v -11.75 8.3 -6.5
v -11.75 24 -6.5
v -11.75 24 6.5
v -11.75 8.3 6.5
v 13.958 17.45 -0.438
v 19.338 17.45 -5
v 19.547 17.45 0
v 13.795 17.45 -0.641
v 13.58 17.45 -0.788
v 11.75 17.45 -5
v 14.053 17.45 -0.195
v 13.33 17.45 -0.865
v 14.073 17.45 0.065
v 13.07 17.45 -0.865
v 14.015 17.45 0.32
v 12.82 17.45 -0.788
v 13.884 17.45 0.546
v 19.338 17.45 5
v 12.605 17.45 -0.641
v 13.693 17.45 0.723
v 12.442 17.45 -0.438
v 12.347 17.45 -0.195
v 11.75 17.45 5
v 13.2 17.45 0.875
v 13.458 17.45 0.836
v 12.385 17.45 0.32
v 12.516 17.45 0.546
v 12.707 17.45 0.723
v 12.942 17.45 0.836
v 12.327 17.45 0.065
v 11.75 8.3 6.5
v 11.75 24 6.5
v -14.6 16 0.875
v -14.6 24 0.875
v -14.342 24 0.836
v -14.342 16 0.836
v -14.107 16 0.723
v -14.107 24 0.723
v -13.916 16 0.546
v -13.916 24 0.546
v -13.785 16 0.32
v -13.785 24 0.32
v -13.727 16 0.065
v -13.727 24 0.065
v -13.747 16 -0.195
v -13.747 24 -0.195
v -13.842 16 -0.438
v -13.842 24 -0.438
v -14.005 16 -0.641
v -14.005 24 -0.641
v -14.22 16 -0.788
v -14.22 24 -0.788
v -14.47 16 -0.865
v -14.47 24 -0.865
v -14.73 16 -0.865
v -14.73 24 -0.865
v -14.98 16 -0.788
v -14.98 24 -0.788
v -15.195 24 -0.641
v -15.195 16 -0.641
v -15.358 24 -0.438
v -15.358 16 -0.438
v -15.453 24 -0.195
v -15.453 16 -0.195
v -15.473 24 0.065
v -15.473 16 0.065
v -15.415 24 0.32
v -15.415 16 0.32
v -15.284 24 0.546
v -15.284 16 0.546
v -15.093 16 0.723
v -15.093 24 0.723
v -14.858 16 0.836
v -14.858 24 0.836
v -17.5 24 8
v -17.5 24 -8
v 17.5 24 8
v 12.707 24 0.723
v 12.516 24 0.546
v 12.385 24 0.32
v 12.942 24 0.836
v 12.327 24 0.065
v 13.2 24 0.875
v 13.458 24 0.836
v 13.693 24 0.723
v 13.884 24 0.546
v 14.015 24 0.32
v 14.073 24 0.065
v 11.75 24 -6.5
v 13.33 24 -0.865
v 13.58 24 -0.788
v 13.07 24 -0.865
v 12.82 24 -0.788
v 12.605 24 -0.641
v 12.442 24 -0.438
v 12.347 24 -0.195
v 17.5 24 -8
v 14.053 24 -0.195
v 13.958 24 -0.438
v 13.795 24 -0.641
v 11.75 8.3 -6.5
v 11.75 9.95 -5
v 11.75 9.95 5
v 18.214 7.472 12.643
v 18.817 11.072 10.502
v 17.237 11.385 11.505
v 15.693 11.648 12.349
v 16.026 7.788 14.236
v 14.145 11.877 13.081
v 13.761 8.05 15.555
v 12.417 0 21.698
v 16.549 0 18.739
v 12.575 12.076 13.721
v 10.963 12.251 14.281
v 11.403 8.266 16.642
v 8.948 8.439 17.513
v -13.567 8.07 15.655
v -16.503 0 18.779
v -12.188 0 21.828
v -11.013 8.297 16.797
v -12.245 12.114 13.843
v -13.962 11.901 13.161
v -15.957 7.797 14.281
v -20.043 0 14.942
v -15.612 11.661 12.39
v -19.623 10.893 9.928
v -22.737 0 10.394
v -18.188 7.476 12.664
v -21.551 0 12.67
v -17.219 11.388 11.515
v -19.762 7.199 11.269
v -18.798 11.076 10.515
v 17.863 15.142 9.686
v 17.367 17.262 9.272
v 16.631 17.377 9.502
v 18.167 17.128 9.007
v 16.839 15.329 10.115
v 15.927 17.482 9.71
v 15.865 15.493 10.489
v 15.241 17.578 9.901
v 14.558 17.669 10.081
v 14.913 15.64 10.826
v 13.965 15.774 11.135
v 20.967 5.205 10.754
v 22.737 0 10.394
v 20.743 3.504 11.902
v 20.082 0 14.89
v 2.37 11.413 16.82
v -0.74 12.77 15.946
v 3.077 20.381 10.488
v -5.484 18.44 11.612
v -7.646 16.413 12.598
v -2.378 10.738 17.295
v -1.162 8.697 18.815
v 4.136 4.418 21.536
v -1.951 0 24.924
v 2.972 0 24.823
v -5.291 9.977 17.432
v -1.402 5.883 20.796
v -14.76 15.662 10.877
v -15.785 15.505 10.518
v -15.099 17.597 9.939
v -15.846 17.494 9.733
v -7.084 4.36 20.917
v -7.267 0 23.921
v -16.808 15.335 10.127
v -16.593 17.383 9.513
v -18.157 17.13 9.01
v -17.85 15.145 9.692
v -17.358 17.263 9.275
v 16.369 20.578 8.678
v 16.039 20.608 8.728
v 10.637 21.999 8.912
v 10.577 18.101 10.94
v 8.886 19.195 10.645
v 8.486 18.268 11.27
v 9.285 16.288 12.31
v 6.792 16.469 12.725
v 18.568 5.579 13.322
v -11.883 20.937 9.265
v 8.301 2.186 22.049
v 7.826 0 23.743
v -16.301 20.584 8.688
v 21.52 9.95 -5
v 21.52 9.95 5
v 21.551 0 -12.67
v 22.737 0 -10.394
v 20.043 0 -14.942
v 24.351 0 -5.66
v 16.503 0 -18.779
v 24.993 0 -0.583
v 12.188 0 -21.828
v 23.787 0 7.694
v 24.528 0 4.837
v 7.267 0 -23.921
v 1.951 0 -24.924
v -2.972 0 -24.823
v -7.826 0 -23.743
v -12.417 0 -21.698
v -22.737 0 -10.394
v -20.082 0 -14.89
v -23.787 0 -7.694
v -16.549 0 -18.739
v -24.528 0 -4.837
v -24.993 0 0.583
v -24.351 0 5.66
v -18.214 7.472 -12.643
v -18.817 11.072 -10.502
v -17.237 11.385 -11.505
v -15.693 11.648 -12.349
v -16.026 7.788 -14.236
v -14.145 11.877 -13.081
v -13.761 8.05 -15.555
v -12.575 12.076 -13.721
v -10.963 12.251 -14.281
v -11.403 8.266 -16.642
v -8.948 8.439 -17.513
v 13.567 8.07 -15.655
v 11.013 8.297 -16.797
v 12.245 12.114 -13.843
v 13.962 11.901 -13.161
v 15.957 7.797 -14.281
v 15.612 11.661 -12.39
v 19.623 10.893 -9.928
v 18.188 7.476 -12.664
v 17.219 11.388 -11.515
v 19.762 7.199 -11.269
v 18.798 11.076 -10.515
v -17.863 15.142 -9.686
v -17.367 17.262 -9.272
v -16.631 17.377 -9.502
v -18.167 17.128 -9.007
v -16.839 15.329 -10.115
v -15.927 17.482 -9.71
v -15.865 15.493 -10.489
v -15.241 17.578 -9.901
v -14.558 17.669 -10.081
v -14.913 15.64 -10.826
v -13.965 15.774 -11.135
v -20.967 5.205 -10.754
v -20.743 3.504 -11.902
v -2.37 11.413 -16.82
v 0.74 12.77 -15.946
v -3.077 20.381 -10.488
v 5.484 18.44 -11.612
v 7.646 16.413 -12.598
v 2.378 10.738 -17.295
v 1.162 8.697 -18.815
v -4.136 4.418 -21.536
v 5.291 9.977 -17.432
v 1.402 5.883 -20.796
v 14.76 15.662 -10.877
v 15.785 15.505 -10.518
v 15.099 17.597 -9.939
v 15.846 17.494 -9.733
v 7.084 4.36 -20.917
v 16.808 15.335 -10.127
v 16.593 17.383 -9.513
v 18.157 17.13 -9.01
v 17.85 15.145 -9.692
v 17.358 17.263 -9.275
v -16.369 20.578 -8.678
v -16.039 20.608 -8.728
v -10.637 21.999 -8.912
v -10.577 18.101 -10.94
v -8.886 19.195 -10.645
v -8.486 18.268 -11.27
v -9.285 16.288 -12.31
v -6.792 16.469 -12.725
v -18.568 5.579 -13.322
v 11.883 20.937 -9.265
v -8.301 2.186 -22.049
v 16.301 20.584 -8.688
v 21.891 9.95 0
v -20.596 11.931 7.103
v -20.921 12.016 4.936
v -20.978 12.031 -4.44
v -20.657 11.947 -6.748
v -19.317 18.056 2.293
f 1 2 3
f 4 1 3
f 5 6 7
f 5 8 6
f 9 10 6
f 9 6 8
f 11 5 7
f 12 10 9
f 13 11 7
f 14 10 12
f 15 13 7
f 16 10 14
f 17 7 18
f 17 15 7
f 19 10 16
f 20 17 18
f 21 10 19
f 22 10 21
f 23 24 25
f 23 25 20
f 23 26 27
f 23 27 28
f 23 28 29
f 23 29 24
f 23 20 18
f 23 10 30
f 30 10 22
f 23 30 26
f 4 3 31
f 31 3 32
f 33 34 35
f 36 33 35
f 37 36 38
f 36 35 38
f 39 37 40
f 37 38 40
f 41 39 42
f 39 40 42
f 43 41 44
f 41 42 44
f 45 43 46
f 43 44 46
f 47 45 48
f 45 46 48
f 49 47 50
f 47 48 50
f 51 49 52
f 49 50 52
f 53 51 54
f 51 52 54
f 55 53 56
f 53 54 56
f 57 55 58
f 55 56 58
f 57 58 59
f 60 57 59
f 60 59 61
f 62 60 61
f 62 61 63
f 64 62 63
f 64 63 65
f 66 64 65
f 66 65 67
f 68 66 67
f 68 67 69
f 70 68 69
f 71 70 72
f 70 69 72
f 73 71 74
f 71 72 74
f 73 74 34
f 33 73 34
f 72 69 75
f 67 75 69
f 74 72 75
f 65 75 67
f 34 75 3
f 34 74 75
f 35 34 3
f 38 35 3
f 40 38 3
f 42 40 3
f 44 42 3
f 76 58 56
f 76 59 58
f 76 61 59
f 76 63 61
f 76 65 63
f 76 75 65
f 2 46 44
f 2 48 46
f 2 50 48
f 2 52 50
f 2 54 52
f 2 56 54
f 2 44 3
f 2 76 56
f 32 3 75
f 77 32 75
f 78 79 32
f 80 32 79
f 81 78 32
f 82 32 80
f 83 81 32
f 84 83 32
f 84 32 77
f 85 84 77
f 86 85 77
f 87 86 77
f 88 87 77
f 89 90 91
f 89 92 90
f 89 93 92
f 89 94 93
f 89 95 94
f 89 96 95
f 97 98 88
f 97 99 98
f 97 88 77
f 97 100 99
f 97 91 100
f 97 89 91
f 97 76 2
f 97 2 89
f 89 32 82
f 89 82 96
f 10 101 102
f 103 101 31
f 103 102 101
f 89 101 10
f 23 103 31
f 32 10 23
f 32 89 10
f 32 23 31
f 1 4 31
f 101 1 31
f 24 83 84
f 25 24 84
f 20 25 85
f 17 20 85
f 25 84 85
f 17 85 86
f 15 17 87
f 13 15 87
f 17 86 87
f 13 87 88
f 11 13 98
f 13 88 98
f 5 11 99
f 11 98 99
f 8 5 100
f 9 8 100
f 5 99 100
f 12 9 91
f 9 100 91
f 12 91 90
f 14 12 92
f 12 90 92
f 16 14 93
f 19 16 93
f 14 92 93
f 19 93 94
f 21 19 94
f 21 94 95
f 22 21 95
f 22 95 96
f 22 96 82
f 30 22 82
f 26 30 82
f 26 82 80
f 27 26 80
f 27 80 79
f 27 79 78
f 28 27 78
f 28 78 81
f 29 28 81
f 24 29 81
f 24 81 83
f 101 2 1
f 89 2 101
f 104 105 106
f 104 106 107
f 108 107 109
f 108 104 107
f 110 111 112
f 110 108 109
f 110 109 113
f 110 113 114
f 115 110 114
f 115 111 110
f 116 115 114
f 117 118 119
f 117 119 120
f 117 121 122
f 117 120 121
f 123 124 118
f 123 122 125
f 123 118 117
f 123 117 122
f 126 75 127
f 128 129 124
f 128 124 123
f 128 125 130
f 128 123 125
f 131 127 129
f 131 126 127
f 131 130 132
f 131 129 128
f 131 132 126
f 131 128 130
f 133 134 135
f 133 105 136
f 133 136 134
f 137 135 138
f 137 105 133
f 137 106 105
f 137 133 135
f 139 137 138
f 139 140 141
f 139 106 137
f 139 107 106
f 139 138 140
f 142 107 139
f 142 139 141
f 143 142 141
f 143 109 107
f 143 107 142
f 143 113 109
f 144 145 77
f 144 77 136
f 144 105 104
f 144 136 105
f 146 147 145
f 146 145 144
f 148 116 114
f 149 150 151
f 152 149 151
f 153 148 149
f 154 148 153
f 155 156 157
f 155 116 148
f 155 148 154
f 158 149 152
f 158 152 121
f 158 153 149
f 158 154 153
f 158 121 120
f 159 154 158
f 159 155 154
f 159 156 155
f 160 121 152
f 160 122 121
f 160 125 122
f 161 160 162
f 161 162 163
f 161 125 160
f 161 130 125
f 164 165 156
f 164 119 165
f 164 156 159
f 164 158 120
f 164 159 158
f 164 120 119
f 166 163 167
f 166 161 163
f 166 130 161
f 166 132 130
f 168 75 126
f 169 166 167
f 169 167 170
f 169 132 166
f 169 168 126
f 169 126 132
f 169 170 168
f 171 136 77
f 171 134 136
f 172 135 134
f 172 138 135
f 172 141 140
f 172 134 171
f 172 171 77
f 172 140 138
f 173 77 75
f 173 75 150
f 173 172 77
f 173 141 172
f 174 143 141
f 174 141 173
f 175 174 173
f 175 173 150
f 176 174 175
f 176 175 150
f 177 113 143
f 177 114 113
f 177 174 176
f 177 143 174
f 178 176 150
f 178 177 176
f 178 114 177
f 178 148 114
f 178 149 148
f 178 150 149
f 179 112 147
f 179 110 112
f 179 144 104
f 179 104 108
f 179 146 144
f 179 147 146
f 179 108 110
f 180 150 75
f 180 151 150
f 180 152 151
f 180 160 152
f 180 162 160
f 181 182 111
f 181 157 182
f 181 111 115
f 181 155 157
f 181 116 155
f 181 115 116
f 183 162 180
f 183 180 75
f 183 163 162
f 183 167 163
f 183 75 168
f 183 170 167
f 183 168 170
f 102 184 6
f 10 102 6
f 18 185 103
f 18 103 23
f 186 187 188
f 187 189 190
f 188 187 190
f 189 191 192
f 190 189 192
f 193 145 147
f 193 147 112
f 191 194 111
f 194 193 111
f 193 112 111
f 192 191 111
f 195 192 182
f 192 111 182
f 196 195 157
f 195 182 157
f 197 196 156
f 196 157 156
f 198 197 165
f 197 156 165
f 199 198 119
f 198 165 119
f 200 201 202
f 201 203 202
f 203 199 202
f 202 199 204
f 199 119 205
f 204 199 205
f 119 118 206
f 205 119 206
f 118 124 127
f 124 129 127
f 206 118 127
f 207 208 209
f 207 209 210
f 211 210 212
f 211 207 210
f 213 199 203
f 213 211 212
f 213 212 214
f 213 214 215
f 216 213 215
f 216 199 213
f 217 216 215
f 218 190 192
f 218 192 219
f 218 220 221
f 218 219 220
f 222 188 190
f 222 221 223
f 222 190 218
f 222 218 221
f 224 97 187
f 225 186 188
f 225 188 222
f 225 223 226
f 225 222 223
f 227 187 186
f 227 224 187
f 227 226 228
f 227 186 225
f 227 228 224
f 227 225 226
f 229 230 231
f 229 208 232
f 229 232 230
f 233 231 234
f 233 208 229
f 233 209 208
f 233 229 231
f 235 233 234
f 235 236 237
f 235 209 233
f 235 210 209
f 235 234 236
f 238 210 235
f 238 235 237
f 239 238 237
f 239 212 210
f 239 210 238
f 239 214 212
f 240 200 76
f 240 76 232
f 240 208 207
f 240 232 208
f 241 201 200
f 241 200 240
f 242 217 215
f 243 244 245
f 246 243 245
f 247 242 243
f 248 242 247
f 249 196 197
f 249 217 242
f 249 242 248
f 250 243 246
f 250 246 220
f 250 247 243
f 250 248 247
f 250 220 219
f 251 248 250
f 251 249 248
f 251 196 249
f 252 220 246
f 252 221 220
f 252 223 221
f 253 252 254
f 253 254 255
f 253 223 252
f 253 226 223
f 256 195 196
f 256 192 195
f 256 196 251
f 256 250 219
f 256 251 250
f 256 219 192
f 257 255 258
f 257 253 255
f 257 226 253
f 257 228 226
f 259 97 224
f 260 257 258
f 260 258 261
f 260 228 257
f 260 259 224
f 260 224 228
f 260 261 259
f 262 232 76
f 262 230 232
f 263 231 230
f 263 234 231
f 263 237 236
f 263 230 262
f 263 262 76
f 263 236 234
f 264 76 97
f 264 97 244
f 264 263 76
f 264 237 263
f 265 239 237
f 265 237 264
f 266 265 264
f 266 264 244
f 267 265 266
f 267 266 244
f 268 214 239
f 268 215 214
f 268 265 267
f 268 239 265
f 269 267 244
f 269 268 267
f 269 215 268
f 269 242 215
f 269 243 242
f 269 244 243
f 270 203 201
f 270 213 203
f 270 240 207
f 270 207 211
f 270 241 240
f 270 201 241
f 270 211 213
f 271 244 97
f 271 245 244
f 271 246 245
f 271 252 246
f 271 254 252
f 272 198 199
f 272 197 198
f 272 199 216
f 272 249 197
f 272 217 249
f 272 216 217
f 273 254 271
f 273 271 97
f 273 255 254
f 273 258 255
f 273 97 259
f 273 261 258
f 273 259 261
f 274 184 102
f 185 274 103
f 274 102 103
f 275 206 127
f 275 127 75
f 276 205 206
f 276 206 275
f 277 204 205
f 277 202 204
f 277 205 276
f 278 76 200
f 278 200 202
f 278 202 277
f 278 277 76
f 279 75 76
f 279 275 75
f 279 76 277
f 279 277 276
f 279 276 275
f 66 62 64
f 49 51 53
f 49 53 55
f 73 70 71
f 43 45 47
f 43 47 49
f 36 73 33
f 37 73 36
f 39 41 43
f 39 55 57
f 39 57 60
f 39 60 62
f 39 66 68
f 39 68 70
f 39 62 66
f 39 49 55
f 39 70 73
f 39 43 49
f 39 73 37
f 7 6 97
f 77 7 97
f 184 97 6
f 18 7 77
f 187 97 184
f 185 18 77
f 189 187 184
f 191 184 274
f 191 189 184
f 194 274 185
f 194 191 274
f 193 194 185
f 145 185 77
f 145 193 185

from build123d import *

# Parameters (mm, degrees)
SKETCH1_W           = 35
SKETCH1_H           = 16
BOSS_EXTRUDE1_DEPTH = 24
SKETCH3_W           = 23.5
SKETCH3_H           = 13
CUT_EXTRUDE1_DEPTH  = 15.7
SKETCH5_R           = 0.875
CUT_EXTRUDE2_DEPTH  = 8
CUT_EXTRUDE3_REACH  = 52.513
SKETCH9_W           = 10
SKETCH9_H           = 7.5


with BuildPart() as part:
    # Sketch1 → Boss-Extrude1 (new body)
    with BuildSketch(Plane(origin=(0, 0, 0), x_dir=(1, 0, 0), z_dir=(0, 1, 0))):
        Rectangle(SKETCH1_W, SKETCH1_H)
    extrude(amount=BOSS_EXTRUDE1_DEPTH)

    # Sketch8 → Loft1 section 0
    with BuildSketch(Plane(origin=(0, 24, 0), x_dir=(1, 0, 0), z_dir=(0, 1, 0))):
        with BuildLine():
            Line((17.5, -8), (-17.5, -8))
            Line((-17.5, -8), (-17.5, 8))
            Line((-17.5, 8), (17.5, 8))
            Line((17.5, 8), (17.5, -8))
        make_face()
    # Sketch7 for Loft1 → Loft1 section 1
    with BuildSketch(Plane.XZ):
        with BuildLine():
            # circular arc as an exact rational Bezier (weights 1, cos(half-angle), 1)
            Bezier((22.73686189, 10.393994007), (0, 60.130879387), (-22.73686189, 10.393994007), weights=[1, 0.41575976, 1])
            Bezier((-22.73686189, 10.393994007), (-27.488402007, 0), (-22.73686189, -10.393994007), weights=[1, 0.909474476, 1])
            Bezier((-22.73686189, -10.393994007), (0, -60.130879387), (22.73686189, -10.393994007), weights=[1, 0.41575976, 1])
            Bezier((22.73686189, -10.393994007), (27.488402007, 0), (22.73686189, 10.393994007), weights=[1, 0.909474476, 1])
        make_face()
    loft()

    # Sketch3 → Cut-Extrude1 (cut)
    with BuildSketch(Plane.XZ.offset(-24)):
        Rectangle(SKETCH3_W, SKETCH3_H)
    extrude(amount=CUT_EXTRUDE1_DEPTH, mode=Mode.SUBTRACT)

    # Sketch5 → Cut-Extrude2 (cut)
    with BuildSketch(Plane(origin=(0, 24, 0), x_dir=(1, 0, 0), z_dir=(0, 1, 0))):
        with Locations(Location((13.2, 0, 0), (0, 0, 270))):
            Circle(SKETCH5_R)
        with Locations(Location((-14.6, 0, 0), (0, 0, 270))):
            Circle(SKETCH5_R)
    extrude(amount=-CUT_EXTRUDE2_DEPTH, mode=Mode.SUBTRACT)

    # Sketch9 → Cut-Extrude3 (cut, up to next)
    with BuildSketch(Plane.ZY.offset(-11.75), mode=Mode.PRIVATE) as cut_extrude3_sk1:
        with Locations((0, 13.7)):
            Rectangle(SKETCH9_W, SKETCH9_H)
    cut_extrude3_tool1 = extrude(cut_extrude3_sk1.sketch, amount=-CUT_EXTRUDE3_REACH, mode=Mode.PRIVATE) & part.part
    add(cut_extrude3_tool1.solids().sort_by_distance((11.75, 13.7, 0))[0], mode=Mode.SUBTRACT)


solid = part.part
